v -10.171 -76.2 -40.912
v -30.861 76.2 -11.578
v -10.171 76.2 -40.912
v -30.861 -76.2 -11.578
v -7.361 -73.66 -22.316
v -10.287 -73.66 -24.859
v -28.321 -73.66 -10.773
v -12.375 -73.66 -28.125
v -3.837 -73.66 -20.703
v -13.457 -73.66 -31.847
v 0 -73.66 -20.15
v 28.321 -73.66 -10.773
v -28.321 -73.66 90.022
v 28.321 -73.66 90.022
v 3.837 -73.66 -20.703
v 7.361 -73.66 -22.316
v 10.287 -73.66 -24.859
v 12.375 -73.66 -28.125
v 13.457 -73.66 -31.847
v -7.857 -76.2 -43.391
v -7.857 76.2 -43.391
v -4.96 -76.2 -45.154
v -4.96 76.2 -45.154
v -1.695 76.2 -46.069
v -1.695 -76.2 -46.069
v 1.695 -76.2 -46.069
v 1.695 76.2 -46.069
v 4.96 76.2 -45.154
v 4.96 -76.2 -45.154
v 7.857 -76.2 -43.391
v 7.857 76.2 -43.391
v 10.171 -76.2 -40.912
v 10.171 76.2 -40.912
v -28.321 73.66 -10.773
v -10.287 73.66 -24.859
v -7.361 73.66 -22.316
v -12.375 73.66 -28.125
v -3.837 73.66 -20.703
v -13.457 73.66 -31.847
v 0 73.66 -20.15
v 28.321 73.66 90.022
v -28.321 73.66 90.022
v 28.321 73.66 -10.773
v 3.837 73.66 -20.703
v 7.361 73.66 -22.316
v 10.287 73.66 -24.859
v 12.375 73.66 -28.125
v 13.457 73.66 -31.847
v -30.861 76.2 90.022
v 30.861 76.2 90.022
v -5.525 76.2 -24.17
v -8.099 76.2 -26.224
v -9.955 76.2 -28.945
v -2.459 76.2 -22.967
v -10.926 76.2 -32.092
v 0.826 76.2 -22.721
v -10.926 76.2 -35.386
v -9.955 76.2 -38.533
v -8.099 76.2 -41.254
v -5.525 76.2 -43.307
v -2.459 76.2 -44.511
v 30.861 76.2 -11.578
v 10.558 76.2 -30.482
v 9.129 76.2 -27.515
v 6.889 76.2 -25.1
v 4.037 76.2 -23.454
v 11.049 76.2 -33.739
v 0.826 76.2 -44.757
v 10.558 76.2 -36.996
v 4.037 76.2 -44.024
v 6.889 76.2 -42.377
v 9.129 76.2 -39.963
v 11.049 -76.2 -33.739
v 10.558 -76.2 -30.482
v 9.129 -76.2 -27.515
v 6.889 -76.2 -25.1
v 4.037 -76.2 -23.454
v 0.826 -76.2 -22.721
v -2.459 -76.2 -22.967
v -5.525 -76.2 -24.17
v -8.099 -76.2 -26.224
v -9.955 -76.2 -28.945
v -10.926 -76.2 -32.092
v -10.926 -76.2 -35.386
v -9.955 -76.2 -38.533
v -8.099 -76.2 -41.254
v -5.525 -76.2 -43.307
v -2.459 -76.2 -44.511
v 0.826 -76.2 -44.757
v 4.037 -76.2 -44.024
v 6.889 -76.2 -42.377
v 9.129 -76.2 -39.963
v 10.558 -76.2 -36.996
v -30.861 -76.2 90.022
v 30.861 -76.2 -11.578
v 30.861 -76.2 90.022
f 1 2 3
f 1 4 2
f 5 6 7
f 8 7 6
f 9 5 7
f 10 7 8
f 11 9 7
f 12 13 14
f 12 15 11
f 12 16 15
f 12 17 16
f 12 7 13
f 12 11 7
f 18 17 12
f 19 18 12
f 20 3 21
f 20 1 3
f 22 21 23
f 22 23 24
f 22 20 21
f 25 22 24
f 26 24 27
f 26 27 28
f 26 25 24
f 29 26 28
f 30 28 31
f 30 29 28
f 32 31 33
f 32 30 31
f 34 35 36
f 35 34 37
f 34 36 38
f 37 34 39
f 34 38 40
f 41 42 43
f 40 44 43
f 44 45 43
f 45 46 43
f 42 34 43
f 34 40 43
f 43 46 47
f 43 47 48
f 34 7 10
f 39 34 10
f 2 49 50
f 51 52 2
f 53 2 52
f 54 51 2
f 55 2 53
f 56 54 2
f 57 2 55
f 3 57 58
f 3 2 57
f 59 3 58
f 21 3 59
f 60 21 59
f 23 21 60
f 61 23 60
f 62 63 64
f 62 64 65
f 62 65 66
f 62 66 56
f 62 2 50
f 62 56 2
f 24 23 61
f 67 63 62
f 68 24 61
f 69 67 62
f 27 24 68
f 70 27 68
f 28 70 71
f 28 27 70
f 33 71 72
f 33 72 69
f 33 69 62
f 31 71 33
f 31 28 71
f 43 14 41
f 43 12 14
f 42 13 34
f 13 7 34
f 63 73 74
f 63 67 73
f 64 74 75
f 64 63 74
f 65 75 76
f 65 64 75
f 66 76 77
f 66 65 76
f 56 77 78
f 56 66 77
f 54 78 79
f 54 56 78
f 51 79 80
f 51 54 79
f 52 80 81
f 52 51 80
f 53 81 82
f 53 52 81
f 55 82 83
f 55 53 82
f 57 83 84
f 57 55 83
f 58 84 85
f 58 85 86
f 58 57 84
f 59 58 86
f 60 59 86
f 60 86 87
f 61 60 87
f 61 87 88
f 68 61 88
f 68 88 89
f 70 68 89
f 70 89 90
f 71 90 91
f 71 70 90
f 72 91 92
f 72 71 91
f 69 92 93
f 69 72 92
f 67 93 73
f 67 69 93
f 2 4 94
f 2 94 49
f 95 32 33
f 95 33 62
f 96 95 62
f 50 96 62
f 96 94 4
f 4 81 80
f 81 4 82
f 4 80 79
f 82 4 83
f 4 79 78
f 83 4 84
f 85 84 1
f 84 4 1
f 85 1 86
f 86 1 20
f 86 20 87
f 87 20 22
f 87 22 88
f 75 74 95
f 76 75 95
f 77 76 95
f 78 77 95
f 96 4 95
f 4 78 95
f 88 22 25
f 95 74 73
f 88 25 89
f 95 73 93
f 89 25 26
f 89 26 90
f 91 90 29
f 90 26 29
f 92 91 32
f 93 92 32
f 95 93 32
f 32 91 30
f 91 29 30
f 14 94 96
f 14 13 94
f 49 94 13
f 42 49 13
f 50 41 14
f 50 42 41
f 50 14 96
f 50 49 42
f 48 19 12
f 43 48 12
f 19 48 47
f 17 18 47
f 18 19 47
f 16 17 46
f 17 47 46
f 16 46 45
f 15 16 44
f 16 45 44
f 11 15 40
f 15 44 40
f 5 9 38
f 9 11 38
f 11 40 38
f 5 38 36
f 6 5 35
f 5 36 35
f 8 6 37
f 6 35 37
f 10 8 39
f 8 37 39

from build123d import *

# Parameters (mm, degrees)
F0_R          = 11.049
F1_DEPTH      = 76.2
F1_DEPTH_BACK = 76.2
F2_W          = 61.722
F2_H          = 152.4
F3_DEPTH      = 101.6
F4_T          = -2.54


with BuildPart() as f1:
    # F0 (on Front) → F1 (new body, two sides)
    with BuildSketch(Plane.XZ) as f1_sk:
        with BuildLine():
            ThreePointArc((10.170598, -40.91247), (11.863519, -37.501733), (12.446, -33.738778))
            ThreePointArc((12.446, -33.738778), (-3.762954, -21.875259), (-10.170598, -40.91247))
            ThreePointArc((-10.170598, -40.91247), (0, -46.184778), (10.170598, -40.91247))
        make_face()
        with Locations((0, -33.738778)):
            Circle(F0_R, mode=Mode.SUBTRACT)
        with BuildLine():
            ThreePointArc((-10.170598, -40.91247), (-3.762954, -21.875259), (12.446, -33.738778))
            ThreePointArc((12.446, -33.738778), (11.863519, -37.501733), (10.170598, -40.91247))
            Line((10.170598, -40.91247), (30.861, -11.578374))
            Line((30.861, -11.578374), (0, -11.578374))
            Line((0, -11.578374), (-30.861, -11.578374))
            Line((-30.861, -11.578374), (-10.170598, -40.91247))
        make_face()
    extrude(amount=F1_DEPTH)
    extrude(f1_sk.sketch, amount=-F1_DEPTH_BACK)

    # F2 (on face) → F3 (join)
    with BuildSketch(Plane.XY.offset(-11.578374)):
        Rectangle(F2_W, F2_H)
    extrude(amount=F3_DEPTH)

    # F4
    f4_openings = [f1.faces().sort_by_distance(p)[0] for p in [
        (0, 0, 90.021626),
    ]]
    offset(amount=F4_T, openings=f4_openings)


solid = f1.part
